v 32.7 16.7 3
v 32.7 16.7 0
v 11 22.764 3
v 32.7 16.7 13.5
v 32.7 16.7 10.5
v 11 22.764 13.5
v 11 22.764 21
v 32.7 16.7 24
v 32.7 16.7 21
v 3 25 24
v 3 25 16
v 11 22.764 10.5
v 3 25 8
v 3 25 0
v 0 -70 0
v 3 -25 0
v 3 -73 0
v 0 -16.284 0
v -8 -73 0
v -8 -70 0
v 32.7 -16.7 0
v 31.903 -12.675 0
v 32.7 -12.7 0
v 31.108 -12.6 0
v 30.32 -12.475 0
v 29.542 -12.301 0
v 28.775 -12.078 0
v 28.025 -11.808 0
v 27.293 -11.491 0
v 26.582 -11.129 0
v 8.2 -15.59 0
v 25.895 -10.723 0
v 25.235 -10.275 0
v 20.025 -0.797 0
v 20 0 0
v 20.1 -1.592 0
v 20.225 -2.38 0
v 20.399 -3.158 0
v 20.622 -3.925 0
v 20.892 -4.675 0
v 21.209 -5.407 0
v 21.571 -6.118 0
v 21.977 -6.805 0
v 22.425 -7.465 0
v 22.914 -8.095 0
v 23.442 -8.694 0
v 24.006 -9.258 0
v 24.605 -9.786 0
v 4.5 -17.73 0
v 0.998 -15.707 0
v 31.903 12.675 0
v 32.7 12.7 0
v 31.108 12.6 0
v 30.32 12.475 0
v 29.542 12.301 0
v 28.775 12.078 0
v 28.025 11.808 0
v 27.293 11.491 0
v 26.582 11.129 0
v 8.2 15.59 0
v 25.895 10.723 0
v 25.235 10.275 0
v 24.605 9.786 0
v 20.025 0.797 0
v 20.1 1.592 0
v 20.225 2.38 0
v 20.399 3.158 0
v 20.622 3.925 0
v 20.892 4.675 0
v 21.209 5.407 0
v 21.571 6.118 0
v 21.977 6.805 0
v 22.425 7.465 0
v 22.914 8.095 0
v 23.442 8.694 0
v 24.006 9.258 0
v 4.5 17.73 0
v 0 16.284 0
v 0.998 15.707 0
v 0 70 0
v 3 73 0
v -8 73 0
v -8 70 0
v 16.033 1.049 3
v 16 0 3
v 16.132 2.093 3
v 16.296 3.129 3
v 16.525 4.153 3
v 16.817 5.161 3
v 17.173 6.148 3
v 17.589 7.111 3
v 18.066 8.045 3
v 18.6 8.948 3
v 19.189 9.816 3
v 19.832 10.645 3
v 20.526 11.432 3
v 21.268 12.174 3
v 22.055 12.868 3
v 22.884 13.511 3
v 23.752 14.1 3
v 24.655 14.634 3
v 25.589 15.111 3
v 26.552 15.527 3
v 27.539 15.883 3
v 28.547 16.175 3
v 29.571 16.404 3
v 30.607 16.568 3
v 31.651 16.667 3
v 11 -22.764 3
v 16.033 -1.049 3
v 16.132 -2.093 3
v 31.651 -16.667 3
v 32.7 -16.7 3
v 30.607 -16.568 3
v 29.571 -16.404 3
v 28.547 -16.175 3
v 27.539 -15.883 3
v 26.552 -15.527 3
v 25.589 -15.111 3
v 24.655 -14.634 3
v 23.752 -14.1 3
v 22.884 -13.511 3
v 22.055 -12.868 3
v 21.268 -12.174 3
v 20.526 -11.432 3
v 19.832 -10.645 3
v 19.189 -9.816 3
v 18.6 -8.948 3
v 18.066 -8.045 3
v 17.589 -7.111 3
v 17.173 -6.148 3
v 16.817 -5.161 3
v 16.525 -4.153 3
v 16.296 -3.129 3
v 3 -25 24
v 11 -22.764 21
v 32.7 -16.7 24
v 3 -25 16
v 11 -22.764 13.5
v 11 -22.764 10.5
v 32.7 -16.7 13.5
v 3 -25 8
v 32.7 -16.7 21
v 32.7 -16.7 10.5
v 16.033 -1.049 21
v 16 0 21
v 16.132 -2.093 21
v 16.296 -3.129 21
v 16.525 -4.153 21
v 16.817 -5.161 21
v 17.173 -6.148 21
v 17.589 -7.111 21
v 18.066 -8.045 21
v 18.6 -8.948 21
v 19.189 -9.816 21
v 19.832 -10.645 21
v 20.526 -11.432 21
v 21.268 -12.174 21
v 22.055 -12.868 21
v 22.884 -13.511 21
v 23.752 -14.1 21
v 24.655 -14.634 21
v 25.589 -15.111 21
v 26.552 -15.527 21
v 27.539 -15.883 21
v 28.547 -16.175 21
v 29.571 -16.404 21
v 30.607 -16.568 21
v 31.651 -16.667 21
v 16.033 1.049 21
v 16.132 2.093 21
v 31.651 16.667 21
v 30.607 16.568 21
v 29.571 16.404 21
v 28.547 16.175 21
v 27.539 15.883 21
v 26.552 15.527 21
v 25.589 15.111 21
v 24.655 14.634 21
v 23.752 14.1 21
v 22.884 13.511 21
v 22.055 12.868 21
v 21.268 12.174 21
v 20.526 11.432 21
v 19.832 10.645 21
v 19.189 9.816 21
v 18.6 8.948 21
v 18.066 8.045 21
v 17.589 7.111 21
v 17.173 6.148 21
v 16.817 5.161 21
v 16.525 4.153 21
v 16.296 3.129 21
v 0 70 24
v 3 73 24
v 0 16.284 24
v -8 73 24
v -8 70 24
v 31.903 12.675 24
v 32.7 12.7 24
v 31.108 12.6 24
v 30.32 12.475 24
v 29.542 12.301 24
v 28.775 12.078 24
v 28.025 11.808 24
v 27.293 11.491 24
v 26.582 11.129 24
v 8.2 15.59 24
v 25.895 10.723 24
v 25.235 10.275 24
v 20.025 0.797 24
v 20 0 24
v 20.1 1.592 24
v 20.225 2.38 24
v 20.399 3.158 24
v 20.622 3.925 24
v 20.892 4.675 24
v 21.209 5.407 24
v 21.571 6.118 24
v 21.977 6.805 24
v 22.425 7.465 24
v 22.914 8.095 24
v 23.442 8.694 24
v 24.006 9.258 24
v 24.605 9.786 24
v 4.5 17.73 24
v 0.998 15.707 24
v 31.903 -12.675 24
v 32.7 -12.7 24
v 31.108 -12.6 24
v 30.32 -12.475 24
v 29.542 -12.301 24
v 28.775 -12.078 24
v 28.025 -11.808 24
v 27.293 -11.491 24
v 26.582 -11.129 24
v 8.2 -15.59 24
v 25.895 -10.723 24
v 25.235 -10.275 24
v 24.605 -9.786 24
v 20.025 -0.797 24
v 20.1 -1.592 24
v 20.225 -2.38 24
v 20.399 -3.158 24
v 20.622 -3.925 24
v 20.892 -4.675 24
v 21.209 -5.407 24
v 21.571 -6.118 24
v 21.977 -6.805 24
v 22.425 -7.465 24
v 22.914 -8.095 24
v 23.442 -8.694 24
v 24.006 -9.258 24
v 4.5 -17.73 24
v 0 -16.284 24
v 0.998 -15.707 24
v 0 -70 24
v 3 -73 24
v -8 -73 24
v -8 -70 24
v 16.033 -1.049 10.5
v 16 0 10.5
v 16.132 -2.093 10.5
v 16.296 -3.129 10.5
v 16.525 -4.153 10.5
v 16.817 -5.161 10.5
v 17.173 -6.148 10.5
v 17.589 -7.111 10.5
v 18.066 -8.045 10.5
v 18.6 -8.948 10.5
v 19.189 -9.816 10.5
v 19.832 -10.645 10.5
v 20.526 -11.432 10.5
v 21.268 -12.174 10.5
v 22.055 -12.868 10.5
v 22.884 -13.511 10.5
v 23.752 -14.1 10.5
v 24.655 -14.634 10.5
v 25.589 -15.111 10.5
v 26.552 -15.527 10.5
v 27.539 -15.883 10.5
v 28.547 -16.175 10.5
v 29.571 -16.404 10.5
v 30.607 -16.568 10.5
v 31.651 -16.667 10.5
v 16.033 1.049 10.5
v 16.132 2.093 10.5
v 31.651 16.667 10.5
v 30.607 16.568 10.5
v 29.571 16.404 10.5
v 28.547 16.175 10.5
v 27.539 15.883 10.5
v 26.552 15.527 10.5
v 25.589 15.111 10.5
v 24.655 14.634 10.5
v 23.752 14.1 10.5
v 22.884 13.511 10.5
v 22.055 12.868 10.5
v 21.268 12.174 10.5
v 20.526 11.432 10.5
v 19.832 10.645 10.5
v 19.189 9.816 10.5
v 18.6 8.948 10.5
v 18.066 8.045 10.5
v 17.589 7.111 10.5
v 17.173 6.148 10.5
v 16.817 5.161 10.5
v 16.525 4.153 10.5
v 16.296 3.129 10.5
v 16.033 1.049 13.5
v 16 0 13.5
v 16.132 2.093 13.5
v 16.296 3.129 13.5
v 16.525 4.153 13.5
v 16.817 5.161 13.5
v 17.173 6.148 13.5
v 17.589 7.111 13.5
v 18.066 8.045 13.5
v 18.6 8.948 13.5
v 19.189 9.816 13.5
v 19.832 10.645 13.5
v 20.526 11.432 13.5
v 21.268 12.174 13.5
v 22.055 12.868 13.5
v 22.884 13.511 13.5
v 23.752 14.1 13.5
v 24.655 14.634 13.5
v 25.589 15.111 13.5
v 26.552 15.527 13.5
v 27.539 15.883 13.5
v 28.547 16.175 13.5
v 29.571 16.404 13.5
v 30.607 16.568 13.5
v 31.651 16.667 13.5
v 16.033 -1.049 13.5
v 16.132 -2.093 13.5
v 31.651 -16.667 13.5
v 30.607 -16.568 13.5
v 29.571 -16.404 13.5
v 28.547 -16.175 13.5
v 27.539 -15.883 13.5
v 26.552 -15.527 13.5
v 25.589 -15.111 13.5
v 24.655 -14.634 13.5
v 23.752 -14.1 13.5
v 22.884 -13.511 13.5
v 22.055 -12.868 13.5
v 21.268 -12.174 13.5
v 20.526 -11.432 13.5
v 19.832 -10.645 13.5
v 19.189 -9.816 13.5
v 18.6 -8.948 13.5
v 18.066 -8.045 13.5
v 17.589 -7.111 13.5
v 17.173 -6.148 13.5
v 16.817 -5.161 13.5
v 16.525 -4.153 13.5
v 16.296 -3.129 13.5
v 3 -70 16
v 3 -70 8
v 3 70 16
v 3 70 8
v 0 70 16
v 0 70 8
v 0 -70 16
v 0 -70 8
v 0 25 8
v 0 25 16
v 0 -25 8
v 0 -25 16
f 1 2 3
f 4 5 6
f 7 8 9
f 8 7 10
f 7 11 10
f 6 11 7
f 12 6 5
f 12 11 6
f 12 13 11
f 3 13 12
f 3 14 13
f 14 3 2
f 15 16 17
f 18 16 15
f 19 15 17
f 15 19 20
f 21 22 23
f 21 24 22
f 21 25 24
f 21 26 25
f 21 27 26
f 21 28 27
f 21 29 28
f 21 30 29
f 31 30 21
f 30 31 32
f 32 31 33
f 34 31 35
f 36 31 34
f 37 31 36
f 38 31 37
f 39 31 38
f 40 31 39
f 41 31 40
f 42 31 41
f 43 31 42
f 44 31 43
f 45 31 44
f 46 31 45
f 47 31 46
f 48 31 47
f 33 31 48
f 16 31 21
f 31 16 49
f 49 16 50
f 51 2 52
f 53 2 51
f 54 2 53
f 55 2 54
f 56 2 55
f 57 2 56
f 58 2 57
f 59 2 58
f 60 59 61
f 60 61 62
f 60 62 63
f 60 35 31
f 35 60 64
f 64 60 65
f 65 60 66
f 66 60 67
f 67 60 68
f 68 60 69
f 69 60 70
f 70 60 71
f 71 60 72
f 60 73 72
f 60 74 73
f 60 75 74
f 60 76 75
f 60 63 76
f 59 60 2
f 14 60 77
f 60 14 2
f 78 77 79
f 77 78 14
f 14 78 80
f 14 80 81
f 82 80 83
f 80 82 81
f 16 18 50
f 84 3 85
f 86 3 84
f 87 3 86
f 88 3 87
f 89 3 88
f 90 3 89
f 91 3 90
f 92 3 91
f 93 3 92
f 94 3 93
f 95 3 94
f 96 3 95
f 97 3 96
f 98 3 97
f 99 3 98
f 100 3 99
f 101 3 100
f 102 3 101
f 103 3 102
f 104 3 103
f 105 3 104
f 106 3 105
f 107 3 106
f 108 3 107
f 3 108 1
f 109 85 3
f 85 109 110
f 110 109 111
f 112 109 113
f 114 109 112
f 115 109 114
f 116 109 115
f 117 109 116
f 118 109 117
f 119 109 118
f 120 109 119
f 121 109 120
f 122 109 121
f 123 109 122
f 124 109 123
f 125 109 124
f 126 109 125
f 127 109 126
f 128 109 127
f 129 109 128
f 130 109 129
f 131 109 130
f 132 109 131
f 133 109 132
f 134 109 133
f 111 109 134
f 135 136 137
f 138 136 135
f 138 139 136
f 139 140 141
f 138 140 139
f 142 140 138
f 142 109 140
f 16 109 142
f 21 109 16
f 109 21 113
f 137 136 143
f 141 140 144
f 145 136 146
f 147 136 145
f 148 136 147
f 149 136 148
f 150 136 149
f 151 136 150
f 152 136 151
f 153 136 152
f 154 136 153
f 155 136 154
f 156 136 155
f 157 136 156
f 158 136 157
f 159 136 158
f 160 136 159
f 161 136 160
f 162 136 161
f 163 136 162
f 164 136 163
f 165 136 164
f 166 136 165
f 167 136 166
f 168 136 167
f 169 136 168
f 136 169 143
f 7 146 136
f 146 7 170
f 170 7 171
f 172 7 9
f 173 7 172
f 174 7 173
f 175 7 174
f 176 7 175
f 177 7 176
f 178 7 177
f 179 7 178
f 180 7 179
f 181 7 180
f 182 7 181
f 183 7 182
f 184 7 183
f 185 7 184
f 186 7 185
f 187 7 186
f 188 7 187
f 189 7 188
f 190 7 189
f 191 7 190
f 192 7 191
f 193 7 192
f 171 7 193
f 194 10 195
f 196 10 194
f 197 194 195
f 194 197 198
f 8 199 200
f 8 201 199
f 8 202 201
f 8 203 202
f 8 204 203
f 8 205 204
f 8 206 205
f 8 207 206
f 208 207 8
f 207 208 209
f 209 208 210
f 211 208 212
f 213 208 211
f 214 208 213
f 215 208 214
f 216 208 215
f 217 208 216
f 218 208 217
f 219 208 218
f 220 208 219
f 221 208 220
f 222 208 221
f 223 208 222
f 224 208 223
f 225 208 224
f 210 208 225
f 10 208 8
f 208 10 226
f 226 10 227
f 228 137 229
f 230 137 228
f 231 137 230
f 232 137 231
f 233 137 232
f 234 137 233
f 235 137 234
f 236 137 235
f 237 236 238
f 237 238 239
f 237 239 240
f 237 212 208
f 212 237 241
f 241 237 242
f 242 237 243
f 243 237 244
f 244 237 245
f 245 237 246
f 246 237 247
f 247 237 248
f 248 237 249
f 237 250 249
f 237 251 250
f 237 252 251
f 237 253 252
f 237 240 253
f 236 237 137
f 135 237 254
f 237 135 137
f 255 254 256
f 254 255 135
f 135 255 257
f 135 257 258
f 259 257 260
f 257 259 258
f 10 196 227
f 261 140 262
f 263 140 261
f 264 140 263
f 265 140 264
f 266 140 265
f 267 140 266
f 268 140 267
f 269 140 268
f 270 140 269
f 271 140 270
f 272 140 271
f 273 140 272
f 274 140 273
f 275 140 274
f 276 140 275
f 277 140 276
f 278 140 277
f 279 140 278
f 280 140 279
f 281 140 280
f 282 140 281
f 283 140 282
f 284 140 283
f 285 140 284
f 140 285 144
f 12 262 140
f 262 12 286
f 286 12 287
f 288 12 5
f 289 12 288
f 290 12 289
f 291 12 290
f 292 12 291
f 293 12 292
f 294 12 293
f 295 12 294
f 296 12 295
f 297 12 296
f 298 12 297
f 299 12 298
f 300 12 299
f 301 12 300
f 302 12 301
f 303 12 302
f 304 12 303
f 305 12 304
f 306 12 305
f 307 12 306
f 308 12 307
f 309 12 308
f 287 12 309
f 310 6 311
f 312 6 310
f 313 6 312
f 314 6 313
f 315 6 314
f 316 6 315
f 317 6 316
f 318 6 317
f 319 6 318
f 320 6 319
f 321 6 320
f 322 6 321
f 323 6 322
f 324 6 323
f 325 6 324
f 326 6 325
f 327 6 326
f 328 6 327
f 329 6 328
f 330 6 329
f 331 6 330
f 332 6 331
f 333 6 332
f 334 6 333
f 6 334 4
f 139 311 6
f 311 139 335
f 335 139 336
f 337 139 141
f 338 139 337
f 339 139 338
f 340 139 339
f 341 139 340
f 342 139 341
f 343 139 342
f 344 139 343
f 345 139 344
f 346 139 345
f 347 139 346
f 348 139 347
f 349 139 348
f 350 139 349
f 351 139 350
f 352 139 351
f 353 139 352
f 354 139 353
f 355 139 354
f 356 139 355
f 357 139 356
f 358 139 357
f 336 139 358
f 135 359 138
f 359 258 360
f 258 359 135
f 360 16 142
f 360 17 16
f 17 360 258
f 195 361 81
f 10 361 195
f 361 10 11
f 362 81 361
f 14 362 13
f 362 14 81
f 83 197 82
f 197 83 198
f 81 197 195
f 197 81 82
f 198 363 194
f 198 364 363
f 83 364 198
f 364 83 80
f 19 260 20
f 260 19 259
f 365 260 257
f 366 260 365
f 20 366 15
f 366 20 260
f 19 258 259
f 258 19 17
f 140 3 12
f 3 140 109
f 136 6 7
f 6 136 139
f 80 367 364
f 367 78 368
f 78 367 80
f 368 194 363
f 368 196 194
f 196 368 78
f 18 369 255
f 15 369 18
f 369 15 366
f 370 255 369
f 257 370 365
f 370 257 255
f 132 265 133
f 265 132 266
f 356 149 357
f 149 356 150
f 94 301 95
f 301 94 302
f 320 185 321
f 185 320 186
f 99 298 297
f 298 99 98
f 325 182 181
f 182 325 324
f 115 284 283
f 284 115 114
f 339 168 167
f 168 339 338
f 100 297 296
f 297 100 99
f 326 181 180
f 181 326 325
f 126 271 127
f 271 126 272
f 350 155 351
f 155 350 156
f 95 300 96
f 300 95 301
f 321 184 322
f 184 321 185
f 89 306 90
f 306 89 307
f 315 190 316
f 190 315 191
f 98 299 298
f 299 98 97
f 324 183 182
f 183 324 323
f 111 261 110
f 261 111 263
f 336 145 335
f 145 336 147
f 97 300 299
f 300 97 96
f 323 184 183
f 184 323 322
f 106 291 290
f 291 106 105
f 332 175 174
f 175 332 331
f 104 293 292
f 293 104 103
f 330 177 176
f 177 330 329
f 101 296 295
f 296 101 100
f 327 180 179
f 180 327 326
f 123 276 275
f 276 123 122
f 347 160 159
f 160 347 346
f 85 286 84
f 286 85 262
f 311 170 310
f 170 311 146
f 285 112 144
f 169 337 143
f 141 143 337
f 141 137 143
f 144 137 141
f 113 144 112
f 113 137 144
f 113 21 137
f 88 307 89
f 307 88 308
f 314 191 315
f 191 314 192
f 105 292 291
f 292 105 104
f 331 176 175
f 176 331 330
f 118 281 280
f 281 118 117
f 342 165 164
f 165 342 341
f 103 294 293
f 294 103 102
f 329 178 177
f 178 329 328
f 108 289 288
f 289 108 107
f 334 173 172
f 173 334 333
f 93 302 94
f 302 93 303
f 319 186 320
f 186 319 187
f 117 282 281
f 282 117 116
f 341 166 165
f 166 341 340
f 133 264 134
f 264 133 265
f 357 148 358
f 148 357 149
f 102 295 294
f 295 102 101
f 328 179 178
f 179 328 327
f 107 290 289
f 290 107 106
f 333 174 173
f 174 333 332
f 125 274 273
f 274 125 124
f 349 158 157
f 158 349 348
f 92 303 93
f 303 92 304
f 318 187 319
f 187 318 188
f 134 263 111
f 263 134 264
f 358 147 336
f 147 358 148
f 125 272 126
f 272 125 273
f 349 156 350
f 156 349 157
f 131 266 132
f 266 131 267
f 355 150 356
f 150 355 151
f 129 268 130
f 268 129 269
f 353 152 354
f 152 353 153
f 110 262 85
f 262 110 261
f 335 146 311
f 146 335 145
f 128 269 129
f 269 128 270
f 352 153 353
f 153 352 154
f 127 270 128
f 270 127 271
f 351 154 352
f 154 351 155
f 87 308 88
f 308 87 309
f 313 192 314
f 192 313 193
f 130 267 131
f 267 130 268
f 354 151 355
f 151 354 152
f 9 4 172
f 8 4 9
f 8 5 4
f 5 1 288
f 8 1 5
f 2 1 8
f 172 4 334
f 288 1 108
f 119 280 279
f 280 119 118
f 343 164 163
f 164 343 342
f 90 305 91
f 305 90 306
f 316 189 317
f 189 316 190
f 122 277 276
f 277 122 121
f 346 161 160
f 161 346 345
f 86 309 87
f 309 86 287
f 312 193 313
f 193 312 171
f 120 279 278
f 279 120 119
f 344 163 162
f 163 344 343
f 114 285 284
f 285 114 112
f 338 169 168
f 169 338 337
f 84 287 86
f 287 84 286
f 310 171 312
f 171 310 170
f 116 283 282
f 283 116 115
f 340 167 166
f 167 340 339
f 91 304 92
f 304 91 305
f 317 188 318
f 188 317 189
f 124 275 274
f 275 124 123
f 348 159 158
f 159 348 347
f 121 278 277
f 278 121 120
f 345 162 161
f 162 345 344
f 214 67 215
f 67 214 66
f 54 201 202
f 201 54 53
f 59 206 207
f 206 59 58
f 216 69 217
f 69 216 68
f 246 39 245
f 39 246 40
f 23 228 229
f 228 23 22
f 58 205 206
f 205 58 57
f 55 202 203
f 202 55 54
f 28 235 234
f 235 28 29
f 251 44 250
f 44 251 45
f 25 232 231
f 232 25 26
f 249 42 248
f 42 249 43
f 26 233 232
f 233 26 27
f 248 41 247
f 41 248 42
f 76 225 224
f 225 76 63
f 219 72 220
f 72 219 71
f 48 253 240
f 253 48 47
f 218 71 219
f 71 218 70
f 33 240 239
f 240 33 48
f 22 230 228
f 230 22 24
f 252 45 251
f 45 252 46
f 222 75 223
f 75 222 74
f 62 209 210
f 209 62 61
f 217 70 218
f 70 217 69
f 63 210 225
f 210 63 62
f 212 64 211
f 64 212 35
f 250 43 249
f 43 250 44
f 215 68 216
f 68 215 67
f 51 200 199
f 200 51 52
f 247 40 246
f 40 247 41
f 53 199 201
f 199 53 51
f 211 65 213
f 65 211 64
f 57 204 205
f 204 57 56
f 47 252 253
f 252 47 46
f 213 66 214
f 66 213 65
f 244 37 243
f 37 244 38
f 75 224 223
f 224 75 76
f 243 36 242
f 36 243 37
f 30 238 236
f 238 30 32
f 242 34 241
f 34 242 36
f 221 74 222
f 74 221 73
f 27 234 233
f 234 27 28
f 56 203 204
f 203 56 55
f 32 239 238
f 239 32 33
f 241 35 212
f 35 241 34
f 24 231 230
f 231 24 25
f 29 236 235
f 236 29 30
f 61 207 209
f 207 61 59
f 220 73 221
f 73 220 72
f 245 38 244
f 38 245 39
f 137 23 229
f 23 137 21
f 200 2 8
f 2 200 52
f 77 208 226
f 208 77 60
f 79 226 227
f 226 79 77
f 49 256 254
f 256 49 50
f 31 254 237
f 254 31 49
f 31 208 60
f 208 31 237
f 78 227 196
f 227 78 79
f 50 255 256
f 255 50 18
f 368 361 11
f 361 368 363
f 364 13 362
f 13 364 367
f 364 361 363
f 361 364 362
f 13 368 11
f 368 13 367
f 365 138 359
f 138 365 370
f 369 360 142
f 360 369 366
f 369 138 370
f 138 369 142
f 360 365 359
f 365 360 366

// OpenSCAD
//circle resolution
$fn=100;

//total width of the mount
mountHeight = 24; 

//length of your phone or case
phoneLength = 140; 

//thickness of the arm
armThichness = 3; 

//width of each arm
armWidth = 8; 

//height of the tab on the two ends of phone
tabHeight = 8; 

//diameter of the handlebar on your bike
barDiameter = 25.4; 

//thickness of the three plates
finThickness = 3; 

//thickness of the arc surface
cylinderThickness = 4; 

//offset of the cutout grabing the phone clamp, larger is looser
tolerance = 0.05; 

offsetDepth = 16+cylinderThickness+barDiameter/2;

hexPts = [
    [0,-15.08-tolerance], //0
    [0,15.08+tolerance], //1
    [4.5,17.68+tolerance], //3
    [8.2,15.54+tolerance], //5
    [8.2,-15.54-tolerance], //4
    [4.5,-17.68-tolerance], //2
    ];

module hex () {
    linear_extrude(height=mountHeight) polygon(hexPts);
}

finPts = [
    [armThichness,25],
    [armThichness,-25],
    [offsetDepth,-barDiameter/2-cylinderThickness],
    [offsetDepth,barDiameter/2+cylinderThickness],
];

module hexClamp (){
difference (){
    linear_extrude(height=mountHeight) polygon(finPts);
translate ([11,-25,0]){    
cube([offsetDepth,50,mountHeight],center=false);
}
}
}

module fin () {
    linear_extrude(height=finThickness) polygon(finPts);
}


module arm () {
translate([0,-phoneLength/2,0]) {
    cube(size = [armThichness,phoneLength,mountHeight], center = false);
    }
}

module armHollow(){
    translate ([0,25,armWidth]) {
    cube ([armThichness,phoneLength/2-25,mountHeight-armWidth*2],center=false);
    
}
}

module tab(){
translate([-tabHeight,phoneLength/2,0]) {
cube(size=[armThichness+tabHeight,armThichness,mountHeight], center = false);
}
}

module tabAll() {
tab();
mirror ([0,1,0]){
    tab();
}
}

module finAll () {
translate([0,0,0]) {
    fin();
}
translate([0,0,mountHeight-finThickness]) {
    fin();
}
translate([0,0,mountHeight/2-finThickness/2]) {
    fin();
}
}

module smallCylinder () {
translate([offsetDepth,0,0]) {
cylinder(h=mountHeight, r=barDiameter/2);
}
}

module largeCylinder () {
translate([offsetDepth,0,0]) {
cylinder(h=mountHeight, r=barDiameter/2+cylinderThickness);
}
}


module positive (){
union () {
        finAll();
        tabAll();
        arm();
        largeCylinder();
        hexClamp();
}
}

module negative(){
    union () {
    smallCylinder();
    translate([offsetDepth,-20,0]) {
        cube(size=[offsetDepth,40,mountHeight], center = false);
    }
    hex();
    translate ([-7,0,0]){
        hex();
        }
    armHollow();
    mirror ([0,1,0]){
        armHollow();};
}
}

difference (){
    positive();
    negative();
}
